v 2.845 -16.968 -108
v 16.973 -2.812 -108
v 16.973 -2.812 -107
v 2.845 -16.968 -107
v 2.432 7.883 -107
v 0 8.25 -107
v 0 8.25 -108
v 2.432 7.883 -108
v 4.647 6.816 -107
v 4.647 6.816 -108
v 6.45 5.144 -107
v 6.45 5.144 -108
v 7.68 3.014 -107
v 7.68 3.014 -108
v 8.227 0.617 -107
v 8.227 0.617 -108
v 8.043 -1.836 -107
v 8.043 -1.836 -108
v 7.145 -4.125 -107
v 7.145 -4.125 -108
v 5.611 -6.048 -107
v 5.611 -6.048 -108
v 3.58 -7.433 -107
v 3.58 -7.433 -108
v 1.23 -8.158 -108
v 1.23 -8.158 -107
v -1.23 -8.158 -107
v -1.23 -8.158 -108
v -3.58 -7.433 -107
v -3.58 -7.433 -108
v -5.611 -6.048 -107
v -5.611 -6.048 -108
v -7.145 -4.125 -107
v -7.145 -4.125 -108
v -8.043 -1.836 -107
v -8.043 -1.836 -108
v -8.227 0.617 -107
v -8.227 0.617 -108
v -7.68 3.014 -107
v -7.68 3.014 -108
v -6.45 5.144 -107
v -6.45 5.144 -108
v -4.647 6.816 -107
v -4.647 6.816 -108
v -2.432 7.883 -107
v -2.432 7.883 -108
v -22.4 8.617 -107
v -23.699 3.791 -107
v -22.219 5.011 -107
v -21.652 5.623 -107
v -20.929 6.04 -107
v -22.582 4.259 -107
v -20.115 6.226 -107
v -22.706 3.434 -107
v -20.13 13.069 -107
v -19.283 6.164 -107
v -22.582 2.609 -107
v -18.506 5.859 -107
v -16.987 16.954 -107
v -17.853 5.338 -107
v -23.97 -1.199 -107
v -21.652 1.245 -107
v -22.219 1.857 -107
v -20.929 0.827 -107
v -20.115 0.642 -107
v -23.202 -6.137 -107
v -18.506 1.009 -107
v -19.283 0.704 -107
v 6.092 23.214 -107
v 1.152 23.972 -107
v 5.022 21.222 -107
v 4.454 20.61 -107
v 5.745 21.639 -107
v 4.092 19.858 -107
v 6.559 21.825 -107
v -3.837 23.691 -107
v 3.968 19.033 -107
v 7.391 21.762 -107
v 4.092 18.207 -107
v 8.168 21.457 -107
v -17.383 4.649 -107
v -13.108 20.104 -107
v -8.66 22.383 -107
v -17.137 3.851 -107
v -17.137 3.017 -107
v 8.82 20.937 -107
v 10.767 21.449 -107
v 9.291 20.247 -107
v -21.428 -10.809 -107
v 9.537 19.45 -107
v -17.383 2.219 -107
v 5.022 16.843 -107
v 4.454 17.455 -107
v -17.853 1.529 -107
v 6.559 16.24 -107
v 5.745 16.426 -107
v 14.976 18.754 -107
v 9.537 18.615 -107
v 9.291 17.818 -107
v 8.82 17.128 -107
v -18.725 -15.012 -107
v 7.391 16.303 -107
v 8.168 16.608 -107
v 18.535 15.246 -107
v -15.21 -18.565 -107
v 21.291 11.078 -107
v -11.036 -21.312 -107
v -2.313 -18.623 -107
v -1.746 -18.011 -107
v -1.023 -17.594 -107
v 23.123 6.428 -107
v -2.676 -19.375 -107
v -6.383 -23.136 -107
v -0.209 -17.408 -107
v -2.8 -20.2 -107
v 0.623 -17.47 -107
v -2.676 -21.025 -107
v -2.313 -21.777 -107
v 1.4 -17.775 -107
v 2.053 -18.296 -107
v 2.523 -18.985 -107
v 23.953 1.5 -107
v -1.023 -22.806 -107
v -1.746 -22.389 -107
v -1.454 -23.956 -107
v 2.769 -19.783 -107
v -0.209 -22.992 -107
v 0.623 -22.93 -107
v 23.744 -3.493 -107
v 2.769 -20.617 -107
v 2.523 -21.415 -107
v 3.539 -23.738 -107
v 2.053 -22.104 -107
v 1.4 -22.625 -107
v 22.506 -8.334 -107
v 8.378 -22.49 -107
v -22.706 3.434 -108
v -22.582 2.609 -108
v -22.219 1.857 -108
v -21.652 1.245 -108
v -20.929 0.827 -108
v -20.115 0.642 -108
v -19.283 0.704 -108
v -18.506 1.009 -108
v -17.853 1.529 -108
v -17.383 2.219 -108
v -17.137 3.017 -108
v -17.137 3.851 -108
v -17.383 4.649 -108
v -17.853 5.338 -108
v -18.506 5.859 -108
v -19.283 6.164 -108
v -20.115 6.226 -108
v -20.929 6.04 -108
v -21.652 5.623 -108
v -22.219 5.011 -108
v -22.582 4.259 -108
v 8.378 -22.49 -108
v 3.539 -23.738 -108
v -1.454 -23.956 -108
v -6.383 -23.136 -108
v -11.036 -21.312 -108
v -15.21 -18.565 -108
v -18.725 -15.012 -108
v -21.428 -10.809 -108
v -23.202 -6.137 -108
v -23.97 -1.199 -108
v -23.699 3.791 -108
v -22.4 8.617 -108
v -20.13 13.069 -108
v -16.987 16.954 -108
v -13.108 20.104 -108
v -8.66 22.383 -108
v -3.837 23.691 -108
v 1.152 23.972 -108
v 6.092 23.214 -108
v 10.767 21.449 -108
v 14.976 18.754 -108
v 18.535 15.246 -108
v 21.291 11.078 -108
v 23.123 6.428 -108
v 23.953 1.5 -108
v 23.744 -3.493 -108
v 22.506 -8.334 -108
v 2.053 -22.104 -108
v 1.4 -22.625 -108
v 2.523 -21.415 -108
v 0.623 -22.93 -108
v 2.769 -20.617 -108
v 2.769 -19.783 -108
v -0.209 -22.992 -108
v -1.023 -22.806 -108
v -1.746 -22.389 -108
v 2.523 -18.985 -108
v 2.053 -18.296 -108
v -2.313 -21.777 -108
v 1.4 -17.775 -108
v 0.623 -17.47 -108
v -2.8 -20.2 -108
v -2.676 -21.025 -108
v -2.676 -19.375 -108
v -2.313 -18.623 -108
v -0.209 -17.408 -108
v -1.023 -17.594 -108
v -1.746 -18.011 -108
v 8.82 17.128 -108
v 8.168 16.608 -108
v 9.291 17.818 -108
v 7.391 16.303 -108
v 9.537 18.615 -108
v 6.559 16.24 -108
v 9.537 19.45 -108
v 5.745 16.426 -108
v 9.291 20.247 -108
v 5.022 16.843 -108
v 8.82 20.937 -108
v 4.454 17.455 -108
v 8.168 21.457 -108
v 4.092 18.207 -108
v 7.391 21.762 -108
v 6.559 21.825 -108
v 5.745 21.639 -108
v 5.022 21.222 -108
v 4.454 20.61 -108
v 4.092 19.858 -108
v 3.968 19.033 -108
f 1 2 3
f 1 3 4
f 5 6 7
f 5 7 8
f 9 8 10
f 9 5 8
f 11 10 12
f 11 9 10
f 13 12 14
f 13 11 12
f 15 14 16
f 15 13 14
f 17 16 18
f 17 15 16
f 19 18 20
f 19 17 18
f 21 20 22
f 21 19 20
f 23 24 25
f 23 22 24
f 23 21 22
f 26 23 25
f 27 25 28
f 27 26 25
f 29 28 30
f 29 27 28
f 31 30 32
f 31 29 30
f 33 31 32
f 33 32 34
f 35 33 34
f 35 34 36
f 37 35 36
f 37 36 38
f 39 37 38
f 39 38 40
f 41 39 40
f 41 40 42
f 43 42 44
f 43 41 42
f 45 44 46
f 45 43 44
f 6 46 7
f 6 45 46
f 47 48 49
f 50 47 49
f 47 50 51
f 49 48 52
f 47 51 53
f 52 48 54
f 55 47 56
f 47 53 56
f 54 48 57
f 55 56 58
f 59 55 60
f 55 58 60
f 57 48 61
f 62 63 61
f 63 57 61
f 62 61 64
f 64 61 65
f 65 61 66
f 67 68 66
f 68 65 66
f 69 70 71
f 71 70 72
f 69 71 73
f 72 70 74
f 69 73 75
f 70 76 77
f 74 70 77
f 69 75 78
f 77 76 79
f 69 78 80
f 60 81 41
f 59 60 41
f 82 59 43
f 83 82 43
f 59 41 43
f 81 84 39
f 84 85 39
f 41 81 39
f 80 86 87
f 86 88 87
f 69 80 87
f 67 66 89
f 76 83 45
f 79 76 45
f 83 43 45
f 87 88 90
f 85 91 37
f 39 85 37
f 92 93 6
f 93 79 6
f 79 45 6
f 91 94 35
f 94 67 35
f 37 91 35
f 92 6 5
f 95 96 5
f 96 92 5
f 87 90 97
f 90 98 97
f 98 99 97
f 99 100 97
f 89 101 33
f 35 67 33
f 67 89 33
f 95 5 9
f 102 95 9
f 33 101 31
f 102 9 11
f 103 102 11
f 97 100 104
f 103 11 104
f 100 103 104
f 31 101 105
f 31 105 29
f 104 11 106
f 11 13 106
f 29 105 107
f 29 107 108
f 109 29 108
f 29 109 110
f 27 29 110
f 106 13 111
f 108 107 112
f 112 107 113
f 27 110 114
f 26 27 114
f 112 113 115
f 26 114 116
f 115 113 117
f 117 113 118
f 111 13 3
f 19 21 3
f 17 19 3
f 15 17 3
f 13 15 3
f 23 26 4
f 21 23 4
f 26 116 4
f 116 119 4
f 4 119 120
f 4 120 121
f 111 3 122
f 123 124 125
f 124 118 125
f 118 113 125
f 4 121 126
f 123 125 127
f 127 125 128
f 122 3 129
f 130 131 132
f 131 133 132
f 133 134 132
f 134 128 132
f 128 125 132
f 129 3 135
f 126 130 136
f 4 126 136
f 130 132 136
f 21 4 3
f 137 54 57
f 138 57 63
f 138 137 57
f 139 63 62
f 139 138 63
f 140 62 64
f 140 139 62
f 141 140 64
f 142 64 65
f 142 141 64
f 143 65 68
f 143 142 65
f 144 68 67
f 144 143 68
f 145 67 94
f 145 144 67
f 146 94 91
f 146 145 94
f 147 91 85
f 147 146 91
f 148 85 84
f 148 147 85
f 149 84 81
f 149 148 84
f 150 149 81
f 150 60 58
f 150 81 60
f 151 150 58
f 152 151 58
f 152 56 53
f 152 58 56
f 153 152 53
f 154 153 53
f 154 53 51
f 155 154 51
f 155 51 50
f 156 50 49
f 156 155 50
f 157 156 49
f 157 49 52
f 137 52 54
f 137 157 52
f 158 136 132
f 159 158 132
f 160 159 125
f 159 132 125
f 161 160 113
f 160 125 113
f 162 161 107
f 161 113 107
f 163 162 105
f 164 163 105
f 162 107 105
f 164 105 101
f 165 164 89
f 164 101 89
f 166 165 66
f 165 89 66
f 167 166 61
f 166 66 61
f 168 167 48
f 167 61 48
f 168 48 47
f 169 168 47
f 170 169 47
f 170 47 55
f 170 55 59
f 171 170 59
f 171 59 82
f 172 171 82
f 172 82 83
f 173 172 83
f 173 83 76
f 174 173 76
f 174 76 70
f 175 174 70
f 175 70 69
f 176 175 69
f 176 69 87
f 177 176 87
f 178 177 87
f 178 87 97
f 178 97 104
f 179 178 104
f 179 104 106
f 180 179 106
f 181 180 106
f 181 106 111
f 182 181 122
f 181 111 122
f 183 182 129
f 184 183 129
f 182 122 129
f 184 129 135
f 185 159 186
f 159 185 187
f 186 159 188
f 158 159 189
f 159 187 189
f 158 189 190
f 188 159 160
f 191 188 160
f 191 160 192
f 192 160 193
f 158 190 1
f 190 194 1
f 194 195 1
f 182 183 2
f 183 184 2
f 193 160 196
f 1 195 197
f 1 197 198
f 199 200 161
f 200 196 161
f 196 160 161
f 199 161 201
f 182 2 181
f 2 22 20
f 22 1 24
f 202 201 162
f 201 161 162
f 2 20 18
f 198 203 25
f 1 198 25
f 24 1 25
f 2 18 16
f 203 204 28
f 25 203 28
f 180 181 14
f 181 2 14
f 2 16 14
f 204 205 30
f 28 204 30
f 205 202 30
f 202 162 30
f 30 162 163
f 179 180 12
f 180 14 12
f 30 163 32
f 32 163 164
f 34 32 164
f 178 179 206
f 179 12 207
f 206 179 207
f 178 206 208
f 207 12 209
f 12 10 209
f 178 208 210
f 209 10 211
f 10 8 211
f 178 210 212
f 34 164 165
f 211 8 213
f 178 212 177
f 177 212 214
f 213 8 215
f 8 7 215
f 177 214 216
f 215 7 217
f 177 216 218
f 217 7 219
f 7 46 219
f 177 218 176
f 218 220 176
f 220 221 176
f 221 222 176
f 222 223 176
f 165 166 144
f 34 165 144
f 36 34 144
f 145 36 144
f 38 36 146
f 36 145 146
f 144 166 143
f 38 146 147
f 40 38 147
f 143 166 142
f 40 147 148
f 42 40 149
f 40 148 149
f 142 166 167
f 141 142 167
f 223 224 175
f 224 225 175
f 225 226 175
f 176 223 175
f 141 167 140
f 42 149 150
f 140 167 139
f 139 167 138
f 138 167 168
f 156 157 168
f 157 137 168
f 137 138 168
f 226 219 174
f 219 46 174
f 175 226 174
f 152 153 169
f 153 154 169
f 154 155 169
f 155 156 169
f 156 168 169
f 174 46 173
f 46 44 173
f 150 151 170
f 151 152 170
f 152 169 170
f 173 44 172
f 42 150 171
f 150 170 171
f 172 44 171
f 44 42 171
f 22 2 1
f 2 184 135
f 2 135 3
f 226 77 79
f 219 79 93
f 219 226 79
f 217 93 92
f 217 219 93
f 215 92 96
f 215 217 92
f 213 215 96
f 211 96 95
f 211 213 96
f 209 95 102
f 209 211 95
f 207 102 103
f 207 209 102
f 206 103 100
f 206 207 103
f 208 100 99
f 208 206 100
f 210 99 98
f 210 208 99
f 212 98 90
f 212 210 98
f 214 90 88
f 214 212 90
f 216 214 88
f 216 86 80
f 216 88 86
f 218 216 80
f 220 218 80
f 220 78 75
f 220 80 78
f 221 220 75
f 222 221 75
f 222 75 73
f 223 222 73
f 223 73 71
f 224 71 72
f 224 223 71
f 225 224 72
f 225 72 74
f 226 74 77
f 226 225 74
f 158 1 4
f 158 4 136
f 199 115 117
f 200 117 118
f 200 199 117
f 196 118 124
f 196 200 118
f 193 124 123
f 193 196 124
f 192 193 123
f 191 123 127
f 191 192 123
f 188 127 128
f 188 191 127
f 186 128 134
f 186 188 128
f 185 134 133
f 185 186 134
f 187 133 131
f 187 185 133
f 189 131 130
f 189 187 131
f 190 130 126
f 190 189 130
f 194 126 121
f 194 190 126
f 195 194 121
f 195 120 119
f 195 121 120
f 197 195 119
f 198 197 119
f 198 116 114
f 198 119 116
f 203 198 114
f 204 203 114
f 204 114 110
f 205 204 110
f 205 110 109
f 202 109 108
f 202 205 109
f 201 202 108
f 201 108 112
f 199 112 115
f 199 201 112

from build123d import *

# Parameters (mm, degrees)
SKETCH3_R               = 2.8
CUT_EXTRUDE2_DEPTH      = 3.25
CUT_EXTRUDE3_DEPTH      = 2
CUT_EXTRUDE4_DEPTH      = 188.637949253
CUT_EXTRUDE4_DEPTH_BACK = 188.637949253
SKETCH5_R               = 8.25
CUT_EXTRUDE5_DEPTH      = 115.087685576
CUT_EXTRUDE5_DEPTH_BACK = 115.087685576
SKETCH6_W               = 80.378885923
SKETCH6_H               = 187.007266033


with BuildPart() as part:
    # Sketch1 → Revolve1 (revolve)
    with BuildSketch(Plane(origin=(0, 0, 0), x_dir=(0, 0, -1), z_dir=(1, 0, 0)), mode=Mode.PRIVATE) as revolve1_sk:
        Polygon((-76, 0), (124.5, 0), (124.5, 4), (109, 4), (109, 8), (108, 8), (108, 24), (104, 24), (104, 25), (0, 25), (0, 26), (-50, 26), (-50, 9), (-52, 9), (-52, 6), (-76, 6), align=None)
    revolve(revolve1_sk.sketch.rotate(Axis((0, 0, 76), (0, 0, -1)), 180), axis=Axis((0, 0, 76), (0, 0, -1)))

    # Sketch3 → Cut-Extrude2 (cut)
    with BuildSketch(Plane.XY.offset(-108)):
        with Locations(Location((6.767859423, 19.032500593, 0), (0, 0, 180))):
            Circle(SKETCH3_R)
        with Locations(Location((-19.905985431, 3.433910891, 0), (0, 0, 180))):
            Circle(SKETCH3_R)
        with Locations(Location((0, -20.2, 0), (0, 0, 180))):
            Circle(SKETCH3_R)
    extrude(amount=CUT_EXTRUDE2_DEPTH, mode=Mode.SUBTRACT)

    # Sketch4 → Cut-Extrude3 (cut)
    with BuildSketch(Plane(origin=(0, 0, -108), x_dir=(-1, 0, 0), z_dir=(0, 0, -1))):
        Polygon((-22.506441861, -8.334271099), (-16.973308635, -2.811902197), (-2.844949371, -16.967800773), (-8.378082597, -22.490169675), (-11.338488517, -25.444816332), (-25.466847781, -11.288917756), align=None)
    extrude(amount=-CUT_EXTRUDE3_DEPTH, mode=Mode.SUBTRACT)

    # Sketch5 → Cut-Extrude4 (cut, two sides: drawn at the far end of the back side and taken through both)
    with BuildSketch(Plane(origin=(0, 0, -108), x_dir=(-1, 0, 0), z_dir=(0, 0, -1)).offset(-CUT_EXTRUDE4_DEPTH_BACK)):
        with Locations(Location((0, 0, 0), (0, 0, 90))):
            Circle(SKETCH5_R)
    extrude(amount=CUT_EXTRUDE4_DEPTH + CUT_EXTRUDE4_DEPTH_BACK, mode=Mode.SUBTRACT)

    # Sketch6 → Cut-Extrude5 (cut, two sides: drawn at the far end of the back side and taken through both)
    with BuildSketch(Plane(origin=(0, 0, 0), x_dir=(1, 0, 0), z_dir=(0, 1, 0)).offset(-CUT_EXTRUDE5_DEPTH_BACK)):
        with Locations((-2.527125216, 13.496366983)):
            Rectangle(SKETCH6_W, SKETCH6_H)
    extrude(amount=CUT_EXTRUDE5_DEPTH + CUT_EXTRUDE5_DEPTH_BACK, mode=Mode.SUBTRACT)


solid = part.part
